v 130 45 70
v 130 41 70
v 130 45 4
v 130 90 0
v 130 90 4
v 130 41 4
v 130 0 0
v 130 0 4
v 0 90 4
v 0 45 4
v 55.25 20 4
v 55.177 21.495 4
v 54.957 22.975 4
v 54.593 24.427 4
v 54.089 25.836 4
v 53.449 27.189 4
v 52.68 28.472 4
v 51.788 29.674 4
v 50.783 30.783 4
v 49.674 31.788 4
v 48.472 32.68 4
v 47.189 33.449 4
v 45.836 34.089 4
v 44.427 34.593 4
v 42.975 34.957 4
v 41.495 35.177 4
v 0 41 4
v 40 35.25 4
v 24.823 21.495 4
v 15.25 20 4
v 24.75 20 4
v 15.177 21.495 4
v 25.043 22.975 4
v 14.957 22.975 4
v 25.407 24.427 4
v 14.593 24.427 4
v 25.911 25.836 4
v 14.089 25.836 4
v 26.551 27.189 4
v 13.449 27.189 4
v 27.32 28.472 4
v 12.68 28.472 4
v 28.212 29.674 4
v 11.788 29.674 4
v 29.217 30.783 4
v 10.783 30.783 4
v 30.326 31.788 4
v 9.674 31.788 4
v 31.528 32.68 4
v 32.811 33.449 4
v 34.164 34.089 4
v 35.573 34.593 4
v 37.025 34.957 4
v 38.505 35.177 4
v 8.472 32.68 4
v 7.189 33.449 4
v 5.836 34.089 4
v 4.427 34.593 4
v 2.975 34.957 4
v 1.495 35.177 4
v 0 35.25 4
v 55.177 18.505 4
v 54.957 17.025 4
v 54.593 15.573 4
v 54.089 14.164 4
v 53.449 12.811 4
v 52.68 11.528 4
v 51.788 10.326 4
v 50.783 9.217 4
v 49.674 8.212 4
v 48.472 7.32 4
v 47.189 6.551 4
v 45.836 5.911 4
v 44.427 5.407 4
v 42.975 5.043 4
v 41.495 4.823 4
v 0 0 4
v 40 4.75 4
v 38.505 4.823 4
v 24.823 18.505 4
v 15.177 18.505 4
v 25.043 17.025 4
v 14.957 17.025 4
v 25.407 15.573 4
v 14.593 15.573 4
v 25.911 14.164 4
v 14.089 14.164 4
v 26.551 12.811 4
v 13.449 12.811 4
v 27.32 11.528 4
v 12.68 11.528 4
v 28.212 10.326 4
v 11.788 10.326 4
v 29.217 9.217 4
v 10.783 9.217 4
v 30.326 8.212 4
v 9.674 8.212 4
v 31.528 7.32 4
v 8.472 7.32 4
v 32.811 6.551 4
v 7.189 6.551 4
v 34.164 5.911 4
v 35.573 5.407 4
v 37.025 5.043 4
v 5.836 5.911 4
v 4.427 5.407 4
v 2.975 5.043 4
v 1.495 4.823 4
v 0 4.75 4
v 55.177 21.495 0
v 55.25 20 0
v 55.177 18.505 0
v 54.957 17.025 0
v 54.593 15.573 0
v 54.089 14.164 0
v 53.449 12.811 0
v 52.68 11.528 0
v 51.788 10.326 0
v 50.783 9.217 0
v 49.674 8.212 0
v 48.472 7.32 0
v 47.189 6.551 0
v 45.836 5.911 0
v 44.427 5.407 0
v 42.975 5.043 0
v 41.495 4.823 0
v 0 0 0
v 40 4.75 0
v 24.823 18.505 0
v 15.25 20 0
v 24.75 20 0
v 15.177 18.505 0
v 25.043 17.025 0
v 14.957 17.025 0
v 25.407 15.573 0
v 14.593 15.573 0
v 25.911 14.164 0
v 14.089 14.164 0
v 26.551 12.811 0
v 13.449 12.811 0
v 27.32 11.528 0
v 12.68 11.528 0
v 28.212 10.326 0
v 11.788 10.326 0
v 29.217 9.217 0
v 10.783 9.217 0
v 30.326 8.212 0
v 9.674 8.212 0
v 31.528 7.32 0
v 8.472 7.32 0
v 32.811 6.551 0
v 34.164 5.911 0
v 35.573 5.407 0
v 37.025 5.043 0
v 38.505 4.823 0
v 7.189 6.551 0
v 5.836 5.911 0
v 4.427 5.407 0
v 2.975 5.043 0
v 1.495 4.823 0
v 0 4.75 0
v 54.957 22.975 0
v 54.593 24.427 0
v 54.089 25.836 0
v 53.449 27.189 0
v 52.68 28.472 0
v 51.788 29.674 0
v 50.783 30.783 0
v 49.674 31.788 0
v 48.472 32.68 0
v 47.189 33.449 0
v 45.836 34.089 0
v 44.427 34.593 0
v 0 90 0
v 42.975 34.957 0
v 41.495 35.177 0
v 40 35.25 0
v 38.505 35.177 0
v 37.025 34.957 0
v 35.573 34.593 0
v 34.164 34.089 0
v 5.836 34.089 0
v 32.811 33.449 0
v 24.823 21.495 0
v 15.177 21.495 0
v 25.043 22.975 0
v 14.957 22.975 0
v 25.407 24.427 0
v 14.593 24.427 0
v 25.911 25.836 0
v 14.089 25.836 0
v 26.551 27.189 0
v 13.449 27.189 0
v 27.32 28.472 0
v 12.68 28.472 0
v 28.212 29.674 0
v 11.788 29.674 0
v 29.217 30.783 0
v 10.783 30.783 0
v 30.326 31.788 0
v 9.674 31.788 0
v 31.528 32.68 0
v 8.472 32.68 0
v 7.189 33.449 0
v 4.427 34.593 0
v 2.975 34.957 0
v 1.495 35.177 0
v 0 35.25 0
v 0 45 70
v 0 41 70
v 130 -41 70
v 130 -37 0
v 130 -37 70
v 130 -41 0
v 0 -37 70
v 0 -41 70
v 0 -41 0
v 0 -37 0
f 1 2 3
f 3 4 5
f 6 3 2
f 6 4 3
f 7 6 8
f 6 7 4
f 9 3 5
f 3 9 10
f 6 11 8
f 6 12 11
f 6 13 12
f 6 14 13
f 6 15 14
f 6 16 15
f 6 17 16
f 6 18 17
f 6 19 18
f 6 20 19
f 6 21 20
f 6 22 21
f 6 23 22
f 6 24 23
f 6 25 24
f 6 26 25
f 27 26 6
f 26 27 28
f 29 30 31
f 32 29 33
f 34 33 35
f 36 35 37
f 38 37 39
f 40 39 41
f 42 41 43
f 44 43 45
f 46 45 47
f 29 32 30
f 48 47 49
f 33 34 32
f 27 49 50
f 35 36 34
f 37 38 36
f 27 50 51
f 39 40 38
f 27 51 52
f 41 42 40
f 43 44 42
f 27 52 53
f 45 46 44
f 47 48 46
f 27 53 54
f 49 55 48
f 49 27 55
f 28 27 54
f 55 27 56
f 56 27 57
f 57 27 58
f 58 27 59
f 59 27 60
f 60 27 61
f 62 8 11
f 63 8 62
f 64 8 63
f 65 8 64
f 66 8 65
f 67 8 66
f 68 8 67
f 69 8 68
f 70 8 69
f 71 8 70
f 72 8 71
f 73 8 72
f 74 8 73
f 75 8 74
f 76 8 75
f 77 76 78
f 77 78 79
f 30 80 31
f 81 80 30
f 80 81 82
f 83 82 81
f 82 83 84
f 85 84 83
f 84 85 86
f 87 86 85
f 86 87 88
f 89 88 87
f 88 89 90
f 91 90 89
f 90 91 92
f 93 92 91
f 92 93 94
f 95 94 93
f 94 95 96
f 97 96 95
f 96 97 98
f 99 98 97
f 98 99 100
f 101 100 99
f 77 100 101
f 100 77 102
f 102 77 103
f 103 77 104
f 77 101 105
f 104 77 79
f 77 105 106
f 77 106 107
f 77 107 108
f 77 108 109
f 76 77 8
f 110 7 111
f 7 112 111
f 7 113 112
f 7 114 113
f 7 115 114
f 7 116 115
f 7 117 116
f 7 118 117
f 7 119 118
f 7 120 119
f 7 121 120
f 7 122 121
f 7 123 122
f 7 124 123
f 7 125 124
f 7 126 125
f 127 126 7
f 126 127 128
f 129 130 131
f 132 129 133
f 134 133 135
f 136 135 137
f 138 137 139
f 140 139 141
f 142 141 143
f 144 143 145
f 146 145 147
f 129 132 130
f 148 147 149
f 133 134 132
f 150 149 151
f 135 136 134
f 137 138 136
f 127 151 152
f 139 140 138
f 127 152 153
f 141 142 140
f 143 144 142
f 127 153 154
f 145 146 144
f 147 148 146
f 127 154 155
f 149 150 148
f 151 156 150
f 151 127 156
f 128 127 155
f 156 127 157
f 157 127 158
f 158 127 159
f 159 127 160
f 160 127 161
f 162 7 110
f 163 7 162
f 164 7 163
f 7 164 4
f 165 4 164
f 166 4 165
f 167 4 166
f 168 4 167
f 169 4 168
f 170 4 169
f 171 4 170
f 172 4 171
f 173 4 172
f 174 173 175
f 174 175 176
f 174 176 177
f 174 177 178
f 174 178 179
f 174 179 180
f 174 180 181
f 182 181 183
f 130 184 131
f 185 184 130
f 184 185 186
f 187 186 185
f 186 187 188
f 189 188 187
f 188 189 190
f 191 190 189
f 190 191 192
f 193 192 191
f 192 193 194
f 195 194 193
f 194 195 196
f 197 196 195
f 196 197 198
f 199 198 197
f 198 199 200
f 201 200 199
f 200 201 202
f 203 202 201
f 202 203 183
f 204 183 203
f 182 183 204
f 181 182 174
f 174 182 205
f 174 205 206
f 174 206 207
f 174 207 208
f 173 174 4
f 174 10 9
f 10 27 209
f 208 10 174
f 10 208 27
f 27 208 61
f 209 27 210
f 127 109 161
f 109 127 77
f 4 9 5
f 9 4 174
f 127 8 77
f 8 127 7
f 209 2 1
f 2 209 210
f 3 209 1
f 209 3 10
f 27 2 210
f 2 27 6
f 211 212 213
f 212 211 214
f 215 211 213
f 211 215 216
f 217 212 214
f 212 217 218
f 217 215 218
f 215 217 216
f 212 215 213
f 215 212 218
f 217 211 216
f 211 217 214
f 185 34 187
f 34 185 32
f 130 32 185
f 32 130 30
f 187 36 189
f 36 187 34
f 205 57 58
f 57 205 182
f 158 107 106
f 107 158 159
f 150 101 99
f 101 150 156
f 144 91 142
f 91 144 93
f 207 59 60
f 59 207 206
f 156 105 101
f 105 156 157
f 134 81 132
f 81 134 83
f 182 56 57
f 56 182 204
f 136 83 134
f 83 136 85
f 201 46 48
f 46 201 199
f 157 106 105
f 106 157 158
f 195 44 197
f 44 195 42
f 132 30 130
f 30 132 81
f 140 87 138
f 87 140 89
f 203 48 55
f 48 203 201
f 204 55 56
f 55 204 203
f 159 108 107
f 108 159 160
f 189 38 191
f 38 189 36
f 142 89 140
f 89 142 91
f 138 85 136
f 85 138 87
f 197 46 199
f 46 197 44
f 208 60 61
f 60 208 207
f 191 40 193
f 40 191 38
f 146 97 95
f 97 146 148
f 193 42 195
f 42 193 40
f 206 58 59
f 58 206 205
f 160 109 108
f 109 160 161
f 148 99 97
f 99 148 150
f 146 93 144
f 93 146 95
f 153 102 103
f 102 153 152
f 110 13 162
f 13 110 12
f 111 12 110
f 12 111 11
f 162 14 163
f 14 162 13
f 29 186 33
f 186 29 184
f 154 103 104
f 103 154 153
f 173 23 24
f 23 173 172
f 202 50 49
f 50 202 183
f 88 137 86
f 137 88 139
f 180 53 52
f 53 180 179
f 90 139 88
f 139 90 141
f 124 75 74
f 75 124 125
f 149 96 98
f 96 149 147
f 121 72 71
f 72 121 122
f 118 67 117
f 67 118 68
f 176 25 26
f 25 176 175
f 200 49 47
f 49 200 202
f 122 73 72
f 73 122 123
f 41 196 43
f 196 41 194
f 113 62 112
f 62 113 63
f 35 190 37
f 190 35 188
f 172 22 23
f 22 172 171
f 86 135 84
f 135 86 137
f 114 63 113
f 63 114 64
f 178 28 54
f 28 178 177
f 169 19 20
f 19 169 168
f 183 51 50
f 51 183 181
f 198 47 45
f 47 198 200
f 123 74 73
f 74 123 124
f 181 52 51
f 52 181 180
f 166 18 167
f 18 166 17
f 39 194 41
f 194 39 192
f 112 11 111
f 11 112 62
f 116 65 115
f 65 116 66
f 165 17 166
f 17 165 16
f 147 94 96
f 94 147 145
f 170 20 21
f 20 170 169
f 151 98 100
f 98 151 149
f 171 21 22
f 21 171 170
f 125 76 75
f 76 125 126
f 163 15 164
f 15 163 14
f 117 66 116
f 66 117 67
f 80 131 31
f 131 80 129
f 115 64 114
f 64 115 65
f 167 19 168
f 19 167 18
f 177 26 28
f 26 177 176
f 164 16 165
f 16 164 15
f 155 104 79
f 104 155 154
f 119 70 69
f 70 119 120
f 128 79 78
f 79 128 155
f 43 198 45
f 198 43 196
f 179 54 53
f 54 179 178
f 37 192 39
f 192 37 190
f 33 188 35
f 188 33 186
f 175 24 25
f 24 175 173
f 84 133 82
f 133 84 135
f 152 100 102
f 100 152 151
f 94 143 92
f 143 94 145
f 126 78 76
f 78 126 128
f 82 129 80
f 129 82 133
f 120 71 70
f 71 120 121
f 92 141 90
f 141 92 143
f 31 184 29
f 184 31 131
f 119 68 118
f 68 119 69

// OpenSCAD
// Rack for six 50 mL conical (Falcon-type) tubes
// Print orientation: flat plate on bed (z=0), walls rise up. Flipped after print.

// Plate dimensions
plate_x = 130;
plate_y = 90;
plate_z = 4;

// Hole parameters
hole_diameter = 30.5;
hole_radius = hole_diameter / 2;
hole_spacing_x = 40;
hole_spacing_y = 40;
num_rows = 2; // along Y
num_cols = 3; // along X

// Wall parameters
wall_length_x = 130;
wall_thickness_y = 4;
wall_height = 70;

// Ensure round holes
$fn = 64;

// Calculate hole positions (centred on plate)
// X positions: centred, spacing 40mm
x_positions = [
    -hole_spacing_x,
    0,
    hole_spacing_x
];

// Y positions: centred, spacing 40mm
y_positions = [
    -hole_spacing_y / 2,
    hole_spacing_y / 2
];

// Build the rack
difference() {
    // Main plate
    union() {
        // Flat plate
        translate([0, 0, 0])
            cube([plate_x, plate_y, plate_z], center = false);
        
        // Two walls along long edges (X-direction)
        // Front wall (positive Y)
        translate([0, plate_y / 2 - wall_thickness_y, 0])
            cube([wall_length_x, wall_thickness_y, wall_height], center = false);
        
        // Back wall (negative Y)
        translate([0, -plate_y / 2 + wall_thickness_y, 0])
            cube([wall_length_x, wall_thickness_y, wall_height], center = false);
    }
    
    // Cut through-holes for tubes
    for (x = x_positions) {
        for (y = y_positions) {
            translate([x, y, -0.01])
                cylinder(r = hole_radius, h = plate_z + 0.02, center = false);
        }
    }
}
